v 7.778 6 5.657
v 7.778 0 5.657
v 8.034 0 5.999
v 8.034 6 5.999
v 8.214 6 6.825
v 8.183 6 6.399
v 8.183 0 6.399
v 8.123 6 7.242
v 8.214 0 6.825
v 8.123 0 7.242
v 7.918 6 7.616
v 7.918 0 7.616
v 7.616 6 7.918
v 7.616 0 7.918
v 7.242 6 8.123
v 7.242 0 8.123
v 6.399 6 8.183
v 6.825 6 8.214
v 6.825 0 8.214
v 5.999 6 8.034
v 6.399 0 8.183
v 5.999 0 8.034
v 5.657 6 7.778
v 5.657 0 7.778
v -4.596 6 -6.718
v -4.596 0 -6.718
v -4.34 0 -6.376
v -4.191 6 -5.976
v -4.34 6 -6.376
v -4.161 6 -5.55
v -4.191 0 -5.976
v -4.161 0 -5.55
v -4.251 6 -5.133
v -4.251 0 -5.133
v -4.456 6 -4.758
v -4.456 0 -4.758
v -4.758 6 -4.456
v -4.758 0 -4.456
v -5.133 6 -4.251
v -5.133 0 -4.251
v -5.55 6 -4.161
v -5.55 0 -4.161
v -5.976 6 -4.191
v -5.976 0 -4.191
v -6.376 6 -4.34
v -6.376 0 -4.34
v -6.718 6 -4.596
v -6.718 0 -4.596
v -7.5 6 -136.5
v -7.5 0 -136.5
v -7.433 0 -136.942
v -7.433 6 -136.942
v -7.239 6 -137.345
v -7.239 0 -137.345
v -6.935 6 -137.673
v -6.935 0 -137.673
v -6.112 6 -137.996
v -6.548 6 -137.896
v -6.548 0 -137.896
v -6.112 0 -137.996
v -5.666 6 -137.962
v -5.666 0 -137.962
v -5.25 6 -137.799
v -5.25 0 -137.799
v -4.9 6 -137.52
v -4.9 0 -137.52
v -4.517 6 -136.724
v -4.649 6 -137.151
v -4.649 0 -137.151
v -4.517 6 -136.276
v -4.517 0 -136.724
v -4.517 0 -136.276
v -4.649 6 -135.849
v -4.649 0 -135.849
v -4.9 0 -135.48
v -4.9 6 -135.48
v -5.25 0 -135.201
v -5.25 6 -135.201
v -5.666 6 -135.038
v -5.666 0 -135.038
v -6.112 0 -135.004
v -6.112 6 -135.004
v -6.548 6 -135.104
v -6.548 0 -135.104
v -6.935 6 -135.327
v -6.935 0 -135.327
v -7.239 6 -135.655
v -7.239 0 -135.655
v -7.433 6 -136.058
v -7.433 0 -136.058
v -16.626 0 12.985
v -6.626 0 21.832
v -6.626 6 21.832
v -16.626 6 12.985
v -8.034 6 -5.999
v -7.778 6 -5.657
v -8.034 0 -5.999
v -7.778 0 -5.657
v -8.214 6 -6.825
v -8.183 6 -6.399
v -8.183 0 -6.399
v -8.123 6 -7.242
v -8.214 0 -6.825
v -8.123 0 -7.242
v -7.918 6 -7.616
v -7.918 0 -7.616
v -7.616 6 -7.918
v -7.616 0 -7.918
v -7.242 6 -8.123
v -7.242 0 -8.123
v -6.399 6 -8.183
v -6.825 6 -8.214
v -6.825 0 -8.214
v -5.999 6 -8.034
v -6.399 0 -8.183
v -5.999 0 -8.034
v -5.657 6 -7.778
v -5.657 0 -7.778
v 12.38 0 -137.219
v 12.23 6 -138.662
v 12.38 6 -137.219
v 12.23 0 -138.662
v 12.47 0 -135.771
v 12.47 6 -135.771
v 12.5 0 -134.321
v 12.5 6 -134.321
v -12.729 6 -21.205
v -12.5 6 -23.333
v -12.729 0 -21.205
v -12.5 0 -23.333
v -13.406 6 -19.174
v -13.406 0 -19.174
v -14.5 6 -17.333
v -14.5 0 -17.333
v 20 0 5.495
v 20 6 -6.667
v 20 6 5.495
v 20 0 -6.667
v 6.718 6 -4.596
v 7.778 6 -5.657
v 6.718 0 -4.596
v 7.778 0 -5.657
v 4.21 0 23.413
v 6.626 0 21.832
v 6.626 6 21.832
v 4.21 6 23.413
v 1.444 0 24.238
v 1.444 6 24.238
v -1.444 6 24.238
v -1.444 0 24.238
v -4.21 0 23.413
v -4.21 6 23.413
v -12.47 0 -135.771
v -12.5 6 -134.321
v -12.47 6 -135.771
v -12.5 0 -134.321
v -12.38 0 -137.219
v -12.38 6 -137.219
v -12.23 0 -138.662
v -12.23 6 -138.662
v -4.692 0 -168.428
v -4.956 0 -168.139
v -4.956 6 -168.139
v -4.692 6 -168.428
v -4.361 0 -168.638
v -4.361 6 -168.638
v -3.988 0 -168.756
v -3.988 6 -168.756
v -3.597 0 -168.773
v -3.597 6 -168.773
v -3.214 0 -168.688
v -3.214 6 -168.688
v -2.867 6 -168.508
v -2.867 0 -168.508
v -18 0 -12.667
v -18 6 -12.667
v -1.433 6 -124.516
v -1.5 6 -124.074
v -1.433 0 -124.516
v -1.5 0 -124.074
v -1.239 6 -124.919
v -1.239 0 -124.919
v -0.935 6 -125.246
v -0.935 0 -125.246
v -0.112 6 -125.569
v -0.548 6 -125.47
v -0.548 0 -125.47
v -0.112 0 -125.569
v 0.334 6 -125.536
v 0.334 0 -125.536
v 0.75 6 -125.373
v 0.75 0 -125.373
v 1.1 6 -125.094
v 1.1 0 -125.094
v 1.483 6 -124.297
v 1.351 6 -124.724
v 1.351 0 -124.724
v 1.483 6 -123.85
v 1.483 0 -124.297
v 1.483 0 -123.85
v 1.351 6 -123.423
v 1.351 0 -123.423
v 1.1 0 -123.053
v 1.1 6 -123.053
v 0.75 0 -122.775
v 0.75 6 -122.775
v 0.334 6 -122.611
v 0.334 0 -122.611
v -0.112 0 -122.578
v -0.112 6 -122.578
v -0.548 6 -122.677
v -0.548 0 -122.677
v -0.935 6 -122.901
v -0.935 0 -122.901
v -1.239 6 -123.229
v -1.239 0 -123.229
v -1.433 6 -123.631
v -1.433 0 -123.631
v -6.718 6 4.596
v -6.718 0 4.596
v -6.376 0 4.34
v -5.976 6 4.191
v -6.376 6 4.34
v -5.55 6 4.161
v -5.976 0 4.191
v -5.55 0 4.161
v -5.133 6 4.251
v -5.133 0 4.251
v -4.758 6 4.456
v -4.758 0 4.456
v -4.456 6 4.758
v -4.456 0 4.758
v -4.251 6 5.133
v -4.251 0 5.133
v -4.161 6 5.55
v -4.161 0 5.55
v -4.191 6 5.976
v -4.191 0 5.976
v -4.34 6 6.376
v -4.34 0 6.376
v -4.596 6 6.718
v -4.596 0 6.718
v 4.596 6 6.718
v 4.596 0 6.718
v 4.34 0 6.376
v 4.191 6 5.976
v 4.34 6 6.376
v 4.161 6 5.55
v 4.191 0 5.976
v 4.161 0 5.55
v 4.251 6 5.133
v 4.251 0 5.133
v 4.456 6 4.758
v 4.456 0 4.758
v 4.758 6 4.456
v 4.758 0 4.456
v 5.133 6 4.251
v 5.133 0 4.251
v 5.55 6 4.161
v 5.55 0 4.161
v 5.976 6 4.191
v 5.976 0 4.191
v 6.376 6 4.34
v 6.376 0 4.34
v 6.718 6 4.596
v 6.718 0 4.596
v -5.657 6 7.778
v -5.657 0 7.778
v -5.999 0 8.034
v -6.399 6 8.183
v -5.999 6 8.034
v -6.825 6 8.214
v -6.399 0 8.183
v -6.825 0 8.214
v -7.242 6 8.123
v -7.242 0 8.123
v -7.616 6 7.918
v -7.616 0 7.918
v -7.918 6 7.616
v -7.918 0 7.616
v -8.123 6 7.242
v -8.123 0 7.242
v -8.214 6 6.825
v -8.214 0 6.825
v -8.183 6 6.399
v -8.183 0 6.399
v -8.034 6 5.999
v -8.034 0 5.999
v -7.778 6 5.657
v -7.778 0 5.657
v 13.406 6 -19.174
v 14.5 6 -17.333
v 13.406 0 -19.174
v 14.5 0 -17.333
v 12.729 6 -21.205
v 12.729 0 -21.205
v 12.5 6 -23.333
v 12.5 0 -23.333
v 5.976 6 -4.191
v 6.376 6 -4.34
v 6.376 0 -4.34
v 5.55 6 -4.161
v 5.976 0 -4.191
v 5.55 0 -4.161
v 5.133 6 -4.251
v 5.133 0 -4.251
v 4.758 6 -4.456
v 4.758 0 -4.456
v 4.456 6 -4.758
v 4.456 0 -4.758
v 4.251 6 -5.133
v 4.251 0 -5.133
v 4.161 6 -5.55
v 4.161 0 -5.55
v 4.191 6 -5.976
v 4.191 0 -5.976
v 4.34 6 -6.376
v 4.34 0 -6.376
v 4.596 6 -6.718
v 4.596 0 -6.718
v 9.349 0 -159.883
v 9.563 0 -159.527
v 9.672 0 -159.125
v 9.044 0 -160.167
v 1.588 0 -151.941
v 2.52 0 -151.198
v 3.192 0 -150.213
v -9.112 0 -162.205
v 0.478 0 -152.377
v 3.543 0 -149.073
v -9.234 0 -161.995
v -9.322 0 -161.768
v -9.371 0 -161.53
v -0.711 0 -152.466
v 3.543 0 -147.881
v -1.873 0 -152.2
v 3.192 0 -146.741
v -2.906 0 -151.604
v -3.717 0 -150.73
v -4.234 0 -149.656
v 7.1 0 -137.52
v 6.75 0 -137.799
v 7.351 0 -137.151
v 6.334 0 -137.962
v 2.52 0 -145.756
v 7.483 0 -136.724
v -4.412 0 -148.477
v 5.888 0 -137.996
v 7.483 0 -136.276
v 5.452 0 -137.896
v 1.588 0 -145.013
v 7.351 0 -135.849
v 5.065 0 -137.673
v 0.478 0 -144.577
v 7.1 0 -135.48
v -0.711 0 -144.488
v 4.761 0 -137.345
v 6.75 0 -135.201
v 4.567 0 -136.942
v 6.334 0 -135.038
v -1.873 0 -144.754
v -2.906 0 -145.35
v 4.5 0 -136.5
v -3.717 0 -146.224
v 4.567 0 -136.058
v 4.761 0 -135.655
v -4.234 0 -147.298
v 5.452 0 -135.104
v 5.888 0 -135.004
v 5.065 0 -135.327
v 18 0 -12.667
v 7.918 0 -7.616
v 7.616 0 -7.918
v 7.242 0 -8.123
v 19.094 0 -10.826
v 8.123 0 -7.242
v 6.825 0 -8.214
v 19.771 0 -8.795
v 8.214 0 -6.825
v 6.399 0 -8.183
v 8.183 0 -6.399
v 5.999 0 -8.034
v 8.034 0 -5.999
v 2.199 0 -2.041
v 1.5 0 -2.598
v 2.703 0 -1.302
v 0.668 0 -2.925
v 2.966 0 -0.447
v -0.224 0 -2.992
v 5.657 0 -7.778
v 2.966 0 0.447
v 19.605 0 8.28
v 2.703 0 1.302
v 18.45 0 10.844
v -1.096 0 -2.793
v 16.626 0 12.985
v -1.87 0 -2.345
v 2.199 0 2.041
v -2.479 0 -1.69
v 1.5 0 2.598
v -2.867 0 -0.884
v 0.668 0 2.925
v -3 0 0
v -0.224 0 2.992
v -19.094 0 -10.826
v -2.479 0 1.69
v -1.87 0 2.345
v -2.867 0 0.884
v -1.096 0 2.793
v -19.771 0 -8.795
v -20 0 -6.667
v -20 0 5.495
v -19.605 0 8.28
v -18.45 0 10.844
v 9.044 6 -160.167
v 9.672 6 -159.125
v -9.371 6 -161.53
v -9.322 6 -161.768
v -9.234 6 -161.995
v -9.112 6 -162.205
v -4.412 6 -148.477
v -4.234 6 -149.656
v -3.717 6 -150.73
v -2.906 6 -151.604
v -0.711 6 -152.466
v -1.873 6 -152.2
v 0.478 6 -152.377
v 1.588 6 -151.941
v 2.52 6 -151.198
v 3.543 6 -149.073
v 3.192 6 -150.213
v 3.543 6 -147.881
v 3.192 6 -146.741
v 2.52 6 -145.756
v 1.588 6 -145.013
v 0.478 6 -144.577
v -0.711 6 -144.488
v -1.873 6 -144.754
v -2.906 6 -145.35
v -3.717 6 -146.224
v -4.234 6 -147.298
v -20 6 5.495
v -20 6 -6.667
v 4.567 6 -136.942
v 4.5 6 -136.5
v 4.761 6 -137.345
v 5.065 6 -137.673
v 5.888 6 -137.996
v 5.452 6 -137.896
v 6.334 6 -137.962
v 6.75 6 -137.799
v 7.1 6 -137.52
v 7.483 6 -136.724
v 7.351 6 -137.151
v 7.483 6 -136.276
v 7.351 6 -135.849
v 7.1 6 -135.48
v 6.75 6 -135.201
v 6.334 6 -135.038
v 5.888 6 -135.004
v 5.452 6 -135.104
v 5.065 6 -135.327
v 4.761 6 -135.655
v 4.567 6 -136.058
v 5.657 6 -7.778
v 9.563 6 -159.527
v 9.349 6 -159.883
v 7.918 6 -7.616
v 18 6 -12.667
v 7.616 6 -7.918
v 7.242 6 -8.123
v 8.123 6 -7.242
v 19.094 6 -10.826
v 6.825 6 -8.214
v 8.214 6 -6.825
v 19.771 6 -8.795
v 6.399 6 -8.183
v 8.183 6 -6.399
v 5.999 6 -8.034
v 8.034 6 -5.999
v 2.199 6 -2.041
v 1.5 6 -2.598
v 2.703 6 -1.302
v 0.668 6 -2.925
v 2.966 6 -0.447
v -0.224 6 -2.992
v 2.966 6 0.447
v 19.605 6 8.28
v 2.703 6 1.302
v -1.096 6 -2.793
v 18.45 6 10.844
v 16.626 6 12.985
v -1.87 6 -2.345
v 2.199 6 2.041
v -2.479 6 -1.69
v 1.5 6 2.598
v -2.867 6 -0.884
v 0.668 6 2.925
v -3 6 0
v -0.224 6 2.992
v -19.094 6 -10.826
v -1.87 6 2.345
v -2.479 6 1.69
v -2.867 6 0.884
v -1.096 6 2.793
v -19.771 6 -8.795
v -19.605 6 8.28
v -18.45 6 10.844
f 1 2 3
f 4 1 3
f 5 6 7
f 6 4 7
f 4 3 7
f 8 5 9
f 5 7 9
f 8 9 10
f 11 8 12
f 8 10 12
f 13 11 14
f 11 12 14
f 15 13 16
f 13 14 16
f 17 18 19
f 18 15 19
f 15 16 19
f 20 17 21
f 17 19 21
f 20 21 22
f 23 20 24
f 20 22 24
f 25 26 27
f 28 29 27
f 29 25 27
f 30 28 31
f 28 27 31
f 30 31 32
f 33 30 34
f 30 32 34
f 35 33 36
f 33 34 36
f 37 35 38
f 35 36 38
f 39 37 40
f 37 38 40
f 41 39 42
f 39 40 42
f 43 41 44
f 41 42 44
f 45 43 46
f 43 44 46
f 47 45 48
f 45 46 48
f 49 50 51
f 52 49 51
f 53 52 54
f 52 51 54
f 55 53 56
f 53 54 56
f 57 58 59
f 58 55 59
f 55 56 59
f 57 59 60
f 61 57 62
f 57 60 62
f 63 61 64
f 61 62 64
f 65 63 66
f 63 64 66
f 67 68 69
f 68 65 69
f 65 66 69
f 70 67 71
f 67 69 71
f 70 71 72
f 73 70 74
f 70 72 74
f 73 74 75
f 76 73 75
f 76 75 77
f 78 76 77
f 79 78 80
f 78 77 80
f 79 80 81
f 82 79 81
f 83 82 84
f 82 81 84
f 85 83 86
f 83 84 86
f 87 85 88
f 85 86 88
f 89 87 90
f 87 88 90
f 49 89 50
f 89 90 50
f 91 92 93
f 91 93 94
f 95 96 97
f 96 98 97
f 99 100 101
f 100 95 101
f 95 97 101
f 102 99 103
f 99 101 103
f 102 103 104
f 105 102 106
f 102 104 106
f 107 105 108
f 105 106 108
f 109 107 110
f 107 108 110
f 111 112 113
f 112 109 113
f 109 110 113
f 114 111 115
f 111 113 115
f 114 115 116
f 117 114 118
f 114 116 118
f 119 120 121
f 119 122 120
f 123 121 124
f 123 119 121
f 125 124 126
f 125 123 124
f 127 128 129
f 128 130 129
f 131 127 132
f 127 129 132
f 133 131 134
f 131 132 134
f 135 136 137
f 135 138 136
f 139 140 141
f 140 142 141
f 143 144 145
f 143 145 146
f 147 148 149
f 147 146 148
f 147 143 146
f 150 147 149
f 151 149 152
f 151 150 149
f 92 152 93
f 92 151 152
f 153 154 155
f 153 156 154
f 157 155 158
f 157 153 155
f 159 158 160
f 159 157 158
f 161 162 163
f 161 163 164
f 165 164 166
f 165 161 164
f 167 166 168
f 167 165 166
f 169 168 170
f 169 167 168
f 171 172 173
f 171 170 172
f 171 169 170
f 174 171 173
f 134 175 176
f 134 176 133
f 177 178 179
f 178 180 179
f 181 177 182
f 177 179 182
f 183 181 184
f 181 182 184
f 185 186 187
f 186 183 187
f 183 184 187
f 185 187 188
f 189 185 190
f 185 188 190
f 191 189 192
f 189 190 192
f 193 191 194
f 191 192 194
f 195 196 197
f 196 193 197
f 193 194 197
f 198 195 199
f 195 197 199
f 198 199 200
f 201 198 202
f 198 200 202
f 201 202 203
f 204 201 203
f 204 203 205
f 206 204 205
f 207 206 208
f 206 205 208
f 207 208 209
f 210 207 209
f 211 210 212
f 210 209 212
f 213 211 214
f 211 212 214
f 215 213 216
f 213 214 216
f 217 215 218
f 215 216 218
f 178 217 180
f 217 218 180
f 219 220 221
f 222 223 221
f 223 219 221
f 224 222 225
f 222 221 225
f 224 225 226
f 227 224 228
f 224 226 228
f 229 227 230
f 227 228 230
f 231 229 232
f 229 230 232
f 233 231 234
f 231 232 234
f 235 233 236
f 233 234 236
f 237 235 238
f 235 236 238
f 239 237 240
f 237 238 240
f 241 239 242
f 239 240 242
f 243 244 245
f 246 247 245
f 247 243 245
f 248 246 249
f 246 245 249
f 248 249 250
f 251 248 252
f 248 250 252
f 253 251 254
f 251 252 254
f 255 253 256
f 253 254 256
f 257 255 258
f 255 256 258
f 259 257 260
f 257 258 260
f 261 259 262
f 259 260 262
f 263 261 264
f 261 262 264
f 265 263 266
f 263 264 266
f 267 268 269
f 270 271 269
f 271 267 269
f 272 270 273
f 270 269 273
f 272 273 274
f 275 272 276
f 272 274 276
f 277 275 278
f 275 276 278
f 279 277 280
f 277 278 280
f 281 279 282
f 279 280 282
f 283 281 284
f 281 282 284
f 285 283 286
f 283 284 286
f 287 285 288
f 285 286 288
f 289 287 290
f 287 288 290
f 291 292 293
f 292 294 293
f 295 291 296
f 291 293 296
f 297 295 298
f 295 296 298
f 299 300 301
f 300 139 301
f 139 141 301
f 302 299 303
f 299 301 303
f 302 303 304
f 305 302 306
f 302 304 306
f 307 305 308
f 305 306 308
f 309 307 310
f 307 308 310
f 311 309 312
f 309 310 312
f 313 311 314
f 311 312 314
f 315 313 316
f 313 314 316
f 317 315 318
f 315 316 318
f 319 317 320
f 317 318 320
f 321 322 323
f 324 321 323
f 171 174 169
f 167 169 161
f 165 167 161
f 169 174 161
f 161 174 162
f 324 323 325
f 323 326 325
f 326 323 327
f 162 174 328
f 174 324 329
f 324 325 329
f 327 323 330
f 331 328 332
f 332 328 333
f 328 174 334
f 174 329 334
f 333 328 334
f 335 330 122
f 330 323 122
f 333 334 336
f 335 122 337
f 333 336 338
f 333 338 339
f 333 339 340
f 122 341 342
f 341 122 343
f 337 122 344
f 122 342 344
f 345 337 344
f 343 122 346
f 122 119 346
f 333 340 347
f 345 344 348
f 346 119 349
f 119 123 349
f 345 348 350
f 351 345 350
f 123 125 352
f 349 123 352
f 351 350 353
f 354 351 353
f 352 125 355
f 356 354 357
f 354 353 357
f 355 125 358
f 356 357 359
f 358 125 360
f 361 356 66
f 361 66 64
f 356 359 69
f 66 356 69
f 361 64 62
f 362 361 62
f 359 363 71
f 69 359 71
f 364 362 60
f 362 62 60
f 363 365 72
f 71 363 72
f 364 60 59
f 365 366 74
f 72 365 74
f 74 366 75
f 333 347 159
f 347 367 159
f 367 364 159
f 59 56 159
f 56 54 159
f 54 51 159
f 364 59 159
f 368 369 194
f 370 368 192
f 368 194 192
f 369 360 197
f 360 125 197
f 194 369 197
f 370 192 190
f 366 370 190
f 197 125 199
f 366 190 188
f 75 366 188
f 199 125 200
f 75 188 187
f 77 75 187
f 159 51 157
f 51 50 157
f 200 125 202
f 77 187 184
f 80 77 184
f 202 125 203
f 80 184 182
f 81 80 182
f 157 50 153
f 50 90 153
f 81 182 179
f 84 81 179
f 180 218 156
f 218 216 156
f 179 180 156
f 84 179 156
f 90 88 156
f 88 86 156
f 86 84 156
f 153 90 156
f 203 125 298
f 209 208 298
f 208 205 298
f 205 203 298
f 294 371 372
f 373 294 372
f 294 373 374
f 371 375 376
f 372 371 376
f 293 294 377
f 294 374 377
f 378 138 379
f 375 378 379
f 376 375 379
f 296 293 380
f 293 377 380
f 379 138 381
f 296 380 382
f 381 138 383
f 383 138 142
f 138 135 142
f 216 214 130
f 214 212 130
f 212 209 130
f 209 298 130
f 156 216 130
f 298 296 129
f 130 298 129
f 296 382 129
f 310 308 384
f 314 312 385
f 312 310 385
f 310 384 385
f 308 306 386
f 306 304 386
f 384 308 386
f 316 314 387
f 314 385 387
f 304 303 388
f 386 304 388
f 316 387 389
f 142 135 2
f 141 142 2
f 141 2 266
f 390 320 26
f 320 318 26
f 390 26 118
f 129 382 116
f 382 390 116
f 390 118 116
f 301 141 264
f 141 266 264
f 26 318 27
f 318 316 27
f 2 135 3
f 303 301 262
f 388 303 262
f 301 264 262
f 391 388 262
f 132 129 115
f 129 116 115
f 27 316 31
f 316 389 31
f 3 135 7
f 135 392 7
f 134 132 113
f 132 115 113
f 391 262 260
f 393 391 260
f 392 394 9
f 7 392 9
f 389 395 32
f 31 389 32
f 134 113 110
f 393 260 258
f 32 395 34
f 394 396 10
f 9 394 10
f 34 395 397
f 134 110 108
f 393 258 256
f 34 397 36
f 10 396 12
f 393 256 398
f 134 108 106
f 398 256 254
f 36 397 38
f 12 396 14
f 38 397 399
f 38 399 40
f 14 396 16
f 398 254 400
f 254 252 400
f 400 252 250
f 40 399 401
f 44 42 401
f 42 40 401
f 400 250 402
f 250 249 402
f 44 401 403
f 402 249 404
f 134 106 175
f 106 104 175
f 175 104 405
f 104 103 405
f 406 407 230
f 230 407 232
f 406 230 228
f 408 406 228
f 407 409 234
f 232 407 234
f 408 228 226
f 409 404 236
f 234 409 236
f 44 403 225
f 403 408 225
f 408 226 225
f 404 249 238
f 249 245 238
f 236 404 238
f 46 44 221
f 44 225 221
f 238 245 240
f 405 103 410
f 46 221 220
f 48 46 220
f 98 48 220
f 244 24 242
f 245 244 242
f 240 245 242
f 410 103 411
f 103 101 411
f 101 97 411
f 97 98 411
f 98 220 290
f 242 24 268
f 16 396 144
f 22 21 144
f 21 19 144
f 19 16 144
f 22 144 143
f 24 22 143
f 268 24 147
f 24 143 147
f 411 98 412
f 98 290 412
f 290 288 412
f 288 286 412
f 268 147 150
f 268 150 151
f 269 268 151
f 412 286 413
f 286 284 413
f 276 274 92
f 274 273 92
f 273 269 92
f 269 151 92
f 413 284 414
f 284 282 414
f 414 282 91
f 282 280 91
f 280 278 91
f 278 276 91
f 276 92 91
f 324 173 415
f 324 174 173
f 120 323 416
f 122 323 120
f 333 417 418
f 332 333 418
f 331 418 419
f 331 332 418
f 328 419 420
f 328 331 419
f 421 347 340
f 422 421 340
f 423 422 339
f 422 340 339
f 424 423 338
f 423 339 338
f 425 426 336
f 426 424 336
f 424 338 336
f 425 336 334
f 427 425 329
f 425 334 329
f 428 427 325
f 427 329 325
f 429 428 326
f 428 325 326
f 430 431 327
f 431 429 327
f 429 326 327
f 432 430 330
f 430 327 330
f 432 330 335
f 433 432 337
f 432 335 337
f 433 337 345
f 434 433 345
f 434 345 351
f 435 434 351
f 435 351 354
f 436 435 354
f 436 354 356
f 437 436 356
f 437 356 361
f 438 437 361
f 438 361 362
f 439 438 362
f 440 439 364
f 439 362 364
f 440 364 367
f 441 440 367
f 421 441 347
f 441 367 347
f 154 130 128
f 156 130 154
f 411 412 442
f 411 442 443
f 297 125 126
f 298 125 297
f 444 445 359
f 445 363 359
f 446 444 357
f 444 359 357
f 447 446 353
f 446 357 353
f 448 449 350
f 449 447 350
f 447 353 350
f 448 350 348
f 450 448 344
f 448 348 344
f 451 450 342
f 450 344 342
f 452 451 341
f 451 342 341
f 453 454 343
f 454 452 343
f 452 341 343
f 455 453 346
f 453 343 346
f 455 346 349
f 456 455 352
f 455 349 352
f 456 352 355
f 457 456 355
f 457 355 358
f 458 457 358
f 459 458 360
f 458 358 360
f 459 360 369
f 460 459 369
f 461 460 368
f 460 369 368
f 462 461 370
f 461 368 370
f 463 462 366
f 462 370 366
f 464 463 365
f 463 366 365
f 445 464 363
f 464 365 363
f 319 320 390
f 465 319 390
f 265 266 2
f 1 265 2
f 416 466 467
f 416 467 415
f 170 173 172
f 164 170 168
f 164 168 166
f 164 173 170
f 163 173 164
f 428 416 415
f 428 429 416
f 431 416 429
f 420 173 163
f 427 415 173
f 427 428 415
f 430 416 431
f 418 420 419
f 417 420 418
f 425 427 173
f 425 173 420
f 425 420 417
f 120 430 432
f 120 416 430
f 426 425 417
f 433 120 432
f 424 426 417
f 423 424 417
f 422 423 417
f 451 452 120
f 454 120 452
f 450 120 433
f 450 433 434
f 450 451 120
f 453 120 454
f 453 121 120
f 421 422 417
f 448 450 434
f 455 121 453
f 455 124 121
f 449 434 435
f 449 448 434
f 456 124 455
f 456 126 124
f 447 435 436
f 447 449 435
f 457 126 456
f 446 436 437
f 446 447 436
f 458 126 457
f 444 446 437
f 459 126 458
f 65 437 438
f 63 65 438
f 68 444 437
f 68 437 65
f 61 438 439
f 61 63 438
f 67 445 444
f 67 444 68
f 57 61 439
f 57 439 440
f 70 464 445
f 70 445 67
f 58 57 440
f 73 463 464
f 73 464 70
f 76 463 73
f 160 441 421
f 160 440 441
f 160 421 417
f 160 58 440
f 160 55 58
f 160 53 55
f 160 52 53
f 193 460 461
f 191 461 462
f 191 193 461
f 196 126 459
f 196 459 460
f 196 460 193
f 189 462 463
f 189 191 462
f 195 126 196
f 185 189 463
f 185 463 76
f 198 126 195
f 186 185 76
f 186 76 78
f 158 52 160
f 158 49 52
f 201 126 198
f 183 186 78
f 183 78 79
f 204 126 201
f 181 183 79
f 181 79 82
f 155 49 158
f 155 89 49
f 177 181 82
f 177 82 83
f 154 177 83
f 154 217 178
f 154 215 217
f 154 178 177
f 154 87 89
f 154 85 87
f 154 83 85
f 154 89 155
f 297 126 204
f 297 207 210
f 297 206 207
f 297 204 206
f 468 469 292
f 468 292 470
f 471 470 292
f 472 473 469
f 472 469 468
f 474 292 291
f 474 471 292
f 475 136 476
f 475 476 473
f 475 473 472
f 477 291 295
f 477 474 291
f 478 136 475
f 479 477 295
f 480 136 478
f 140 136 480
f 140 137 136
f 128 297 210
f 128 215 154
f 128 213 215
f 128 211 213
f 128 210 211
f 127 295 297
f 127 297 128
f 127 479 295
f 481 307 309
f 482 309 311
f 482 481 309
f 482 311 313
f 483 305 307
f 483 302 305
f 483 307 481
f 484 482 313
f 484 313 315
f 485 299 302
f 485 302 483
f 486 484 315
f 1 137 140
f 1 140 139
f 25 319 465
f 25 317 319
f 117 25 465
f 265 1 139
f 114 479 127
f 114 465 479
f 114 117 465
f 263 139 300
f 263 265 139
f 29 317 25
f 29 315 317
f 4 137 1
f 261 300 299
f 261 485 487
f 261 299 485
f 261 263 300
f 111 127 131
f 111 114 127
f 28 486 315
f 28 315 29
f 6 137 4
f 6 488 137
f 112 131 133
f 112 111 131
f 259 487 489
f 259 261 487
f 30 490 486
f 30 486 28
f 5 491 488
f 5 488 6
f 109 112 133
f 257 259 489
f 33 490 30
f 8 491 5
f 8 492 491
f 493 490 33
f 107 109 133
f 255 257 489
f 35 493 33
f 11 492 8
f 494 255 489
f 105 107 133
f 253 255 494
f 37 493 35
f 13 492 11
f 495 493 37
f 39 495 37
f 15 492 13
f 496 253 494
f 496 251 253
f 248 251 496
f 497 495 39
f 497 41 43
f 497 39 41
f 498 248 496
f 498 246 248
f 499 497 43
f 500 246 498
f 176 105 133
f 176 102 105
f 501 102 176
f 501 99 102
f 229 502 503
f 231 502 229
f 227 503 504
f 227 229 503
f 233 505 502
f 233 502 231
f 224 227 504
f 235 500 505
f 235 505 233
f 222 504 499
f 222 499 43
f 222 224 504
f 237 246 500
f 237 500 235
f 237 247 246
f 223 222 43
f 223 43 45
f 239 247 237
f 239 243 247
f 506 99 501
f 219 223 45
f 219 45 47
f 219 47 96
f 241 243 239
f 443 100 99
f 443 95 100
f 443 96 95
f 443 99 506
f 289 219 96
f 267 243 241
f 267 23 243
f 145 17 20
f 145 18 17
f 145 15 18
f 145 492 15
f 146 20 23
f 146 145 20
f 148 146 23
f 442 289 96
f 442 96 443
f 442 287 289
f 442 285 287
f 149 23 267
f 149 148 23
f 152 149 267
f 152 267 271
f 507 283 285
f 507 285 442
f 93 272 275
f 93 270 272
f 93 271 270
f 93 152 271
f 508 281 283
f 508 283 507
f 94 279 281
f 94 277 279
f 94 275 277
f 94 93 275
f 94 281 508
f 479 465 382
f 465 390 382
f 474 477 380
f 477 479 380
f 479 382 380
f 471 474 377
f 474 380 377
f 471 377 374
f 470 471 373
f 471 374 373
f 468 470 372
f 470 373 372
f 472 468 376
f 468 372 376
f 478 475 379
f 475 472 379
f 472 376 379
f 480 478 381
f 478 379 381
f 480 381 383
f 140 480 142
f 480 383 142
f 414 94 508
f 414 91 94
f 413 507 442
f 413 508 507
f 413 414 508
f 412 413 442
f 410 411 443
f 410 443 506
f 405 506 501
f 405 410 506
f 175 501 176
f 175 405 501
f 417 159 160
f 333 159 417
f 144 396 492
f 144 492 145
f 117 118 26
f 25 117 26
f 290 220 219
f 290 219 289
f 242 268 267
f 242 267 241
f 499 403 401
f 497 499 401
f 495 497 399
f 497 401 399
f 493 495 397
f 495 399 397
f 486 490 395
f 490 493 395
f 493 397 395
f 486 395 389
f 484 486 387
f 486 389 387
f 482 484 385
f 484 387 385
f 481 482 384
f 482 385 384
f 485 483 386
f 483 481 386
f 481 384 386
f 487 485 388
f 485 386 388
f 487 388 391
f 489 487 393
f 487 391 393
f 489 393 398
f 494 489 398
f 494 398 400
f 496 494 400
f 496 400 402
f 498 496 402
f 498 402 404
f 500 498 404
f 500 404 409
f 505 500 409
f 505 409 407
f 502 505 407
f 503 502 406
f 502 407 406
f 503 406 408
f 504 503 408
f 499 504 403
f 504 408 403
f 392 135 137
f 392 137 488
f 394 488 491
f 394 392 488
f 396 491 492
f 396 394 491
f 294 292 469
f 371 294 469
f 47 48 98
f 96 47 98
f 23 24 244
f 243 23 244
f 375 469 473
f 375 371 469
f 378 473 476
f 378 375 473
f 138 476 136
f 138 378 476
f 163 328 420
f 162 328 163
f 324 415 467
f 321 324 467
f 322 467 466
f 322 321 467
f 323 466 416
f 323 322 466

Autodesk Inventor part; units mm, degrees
ref_plane "YZ Plane" through (0, 0, 0) normal (1, 0, 0) x (0, 1, 0)
ref_plane "XZ Plane" through (0, 0, 0) normal (0, 1, 0) x (-1, 0, 0)
ref_plane "XY Plane" through (0, 0, 0) normal (0, 0, 1) x (1, 0, 0)
sketch "Sketch1" plane through (0, 0, 0) normal (0, 1, 0) x (-1, 0, 0)
  circle A0 centre (0.4121, -148.477) radius 4
  arc A1 (9.1115, -162.2046) -> (9.3712, -161.5303) centre (7.8828, -161.3443) ccw
  line L0 (9.1115, -162.2046) -> (4.9561, -168.1392)
  arc A2 (2.867, -168.5075) -> (4.9561, -168.1392) centre (3.7274, -167.2788) ccw
  line L1 (2.867, -168.5075) -> (-9.0439, -160.1674)
  arc A3 (-9.6719, -159.1247) -> (-9.0439, -160.1674) centre (-8.1835, -158.9387) ccw
  line L2 (-9.6719, -159.1247) -> (-12.2297, -138.6622)
  arc A4 (-12.5, -134.321) -> (-12.2297, -138.6622) centre (22.5, -134.321) ccw
  line L3 (-12.5, -134.321) -> (-12.5, -23.3333)
  arc A5 (-12.5, -23.3333) -> (-14.5, -17.3333) centre (-22.5, -23.3333) ccw
  line L4 (-14.5, -17.3333) -> (-18, -12.6667)
  arc A6 (-20, -6.6667) -> (-18, -12.6667) centre (-10, -6.6667) ccw
  line L5 (-20, -6.6667) -> (-20, 5.4953)
  arc A7 (-16.6262, 12.9849) -> (-20, 5.4953) centre (-10, 5.4953) ccw
  line L6 (-16.6262, 12.9849) -> (-6.6262, 21.8321)
  arc A8 (6.6262, 21.8321) -> (-6.6262, 21.8321) centre (0, 14.3426) ccw
  line L7 (6.6262, 21.8321) -> (16.6262, 12.9849)
  arc A9 (20, 5.4953) -> (16.6262, 12.9849) centre (10, 5.4953) ccw
  line L8 (20, 5.4953) -> (20, -6.6667)
  arc A10 (18, -12.6667) -> (20, -6.6667) centre (10, -6.6667) ccw
  line L9 (18, -12.6667) -> (14.5, -17.3333)
  arc A11 (14.5, -17.3333) -> (12.5, -23.3333) centre (22.5, -23.3333) ccw
  line L10 (12.5, -23.3333) -> (12.5, -134.321)
  arc A12 (12.2297, -138.6622) -> (12.5, -134.321) centre (-22.5, -134.321) ccw
  line L11 (12.2297, -138.6622) -> (9.3712, -161.5303)
  arc A13 (-7.7782, -5.6569) -> (-5.6569, -7.7782) centre (-6.7175, -6.7175) ccw
  line L12 (-7.7782, -5.6569) -> (-6.7175, -4.5962)
  arc A14 (-4.5962, -6.7175) -> (-6.7175, -4.5962) centre (-5.6569, -5.6569) ccw
  line L13 (-4.5962, -6.7175) -> (-5.6569, -7.7782)
  circle A15 centre (-6, -136.5) radius 1.5
  circle A16 centre (6, -136.5) radius 1.5
  arc A17 (5.6569, -7.7782) -> (7.7782, -5.6569) centre (6.7175, -6.7175) ccw
  line L14 (5.6569, -7.7782) -> (4.5962, -6.7175)
  arc A18 (6.7175, -4.5962) -> (4.5962, -6.7175) centre (5.6569, -5.6569) ccw
  line L15 (6.7175, -4.5962) -> (7.7782, -5.6569)
  circle A19 centre (0, -124.0736) radius 1.5
  line L16 (6.7175, 4.5962) -> (7.7782, 5.6569)
  arc A20 (7.7782, 5.6569) -> (5.6569, 7.7782) centre (6.7175, 6.7175) ccw
  line L17 (5.6569, 7.7782) -> (4.5962, 6.7175)
  arc A21 (4.5962, 6.7175) -> (6.7175, 4.5962) centre (5.6569, 5.6569) ccw
  circle A22 centre (0, 0) radius 3
  arc A23 (-6.7175, 4.5962) -> (-4.5962, 6.7175) centre (-5.6569, 5.6569) ccw
  line L18 (-6.7175, 4.5962) -> (-7.7782, 5.6569)
  arc A24 (-5.6569, 7.7782) -> (-7.7782, 5.6569) centre (-6.7175, 6.7175) ccw
  line L19 (-5.6569, 7.7782) -> (-4.5962, 6.7175)
  point P0 (12.5, -23.3333)
  point P1 (14.5, -17.3333)
  point P2 (16.6262, 12.9849)
  point P3 (6.6262, 21.8321)
  point P4 (-6.6262, 21.8321)
  point P5 (-18, -12.6667)
  point P6 (-12.5, -23.3333)
  point P7 (4.9561, -168.1392)
  point P8 (7.7782, -5.6569)
  point P9 (5.6569, -7.7782)
  point P10 (4.5962, -6.7175)
  point P11 (6.7175, 4.5962)
  point P12 (-7.7782, 5.6569)
  point P13 (-5.6569, 7.7782)
  point P14 (-4.5962, -6.7175)
  point P15 (-5.6569, -7.7782)
extrude "Extrusion1" add sketch "Sketch1" along normal blind 6
sketch "Sketch2" plane through (0, 6, 0) normal (0, 1, 0) x (1, 0, 0)
  circle A0 centre (0, 124.0736) radius 1.5 construction
  circle A1 centre (-0.4121, 148.477) radius 4 construction
  point P0 (0, 0)
properties part number "og kauri arm"
